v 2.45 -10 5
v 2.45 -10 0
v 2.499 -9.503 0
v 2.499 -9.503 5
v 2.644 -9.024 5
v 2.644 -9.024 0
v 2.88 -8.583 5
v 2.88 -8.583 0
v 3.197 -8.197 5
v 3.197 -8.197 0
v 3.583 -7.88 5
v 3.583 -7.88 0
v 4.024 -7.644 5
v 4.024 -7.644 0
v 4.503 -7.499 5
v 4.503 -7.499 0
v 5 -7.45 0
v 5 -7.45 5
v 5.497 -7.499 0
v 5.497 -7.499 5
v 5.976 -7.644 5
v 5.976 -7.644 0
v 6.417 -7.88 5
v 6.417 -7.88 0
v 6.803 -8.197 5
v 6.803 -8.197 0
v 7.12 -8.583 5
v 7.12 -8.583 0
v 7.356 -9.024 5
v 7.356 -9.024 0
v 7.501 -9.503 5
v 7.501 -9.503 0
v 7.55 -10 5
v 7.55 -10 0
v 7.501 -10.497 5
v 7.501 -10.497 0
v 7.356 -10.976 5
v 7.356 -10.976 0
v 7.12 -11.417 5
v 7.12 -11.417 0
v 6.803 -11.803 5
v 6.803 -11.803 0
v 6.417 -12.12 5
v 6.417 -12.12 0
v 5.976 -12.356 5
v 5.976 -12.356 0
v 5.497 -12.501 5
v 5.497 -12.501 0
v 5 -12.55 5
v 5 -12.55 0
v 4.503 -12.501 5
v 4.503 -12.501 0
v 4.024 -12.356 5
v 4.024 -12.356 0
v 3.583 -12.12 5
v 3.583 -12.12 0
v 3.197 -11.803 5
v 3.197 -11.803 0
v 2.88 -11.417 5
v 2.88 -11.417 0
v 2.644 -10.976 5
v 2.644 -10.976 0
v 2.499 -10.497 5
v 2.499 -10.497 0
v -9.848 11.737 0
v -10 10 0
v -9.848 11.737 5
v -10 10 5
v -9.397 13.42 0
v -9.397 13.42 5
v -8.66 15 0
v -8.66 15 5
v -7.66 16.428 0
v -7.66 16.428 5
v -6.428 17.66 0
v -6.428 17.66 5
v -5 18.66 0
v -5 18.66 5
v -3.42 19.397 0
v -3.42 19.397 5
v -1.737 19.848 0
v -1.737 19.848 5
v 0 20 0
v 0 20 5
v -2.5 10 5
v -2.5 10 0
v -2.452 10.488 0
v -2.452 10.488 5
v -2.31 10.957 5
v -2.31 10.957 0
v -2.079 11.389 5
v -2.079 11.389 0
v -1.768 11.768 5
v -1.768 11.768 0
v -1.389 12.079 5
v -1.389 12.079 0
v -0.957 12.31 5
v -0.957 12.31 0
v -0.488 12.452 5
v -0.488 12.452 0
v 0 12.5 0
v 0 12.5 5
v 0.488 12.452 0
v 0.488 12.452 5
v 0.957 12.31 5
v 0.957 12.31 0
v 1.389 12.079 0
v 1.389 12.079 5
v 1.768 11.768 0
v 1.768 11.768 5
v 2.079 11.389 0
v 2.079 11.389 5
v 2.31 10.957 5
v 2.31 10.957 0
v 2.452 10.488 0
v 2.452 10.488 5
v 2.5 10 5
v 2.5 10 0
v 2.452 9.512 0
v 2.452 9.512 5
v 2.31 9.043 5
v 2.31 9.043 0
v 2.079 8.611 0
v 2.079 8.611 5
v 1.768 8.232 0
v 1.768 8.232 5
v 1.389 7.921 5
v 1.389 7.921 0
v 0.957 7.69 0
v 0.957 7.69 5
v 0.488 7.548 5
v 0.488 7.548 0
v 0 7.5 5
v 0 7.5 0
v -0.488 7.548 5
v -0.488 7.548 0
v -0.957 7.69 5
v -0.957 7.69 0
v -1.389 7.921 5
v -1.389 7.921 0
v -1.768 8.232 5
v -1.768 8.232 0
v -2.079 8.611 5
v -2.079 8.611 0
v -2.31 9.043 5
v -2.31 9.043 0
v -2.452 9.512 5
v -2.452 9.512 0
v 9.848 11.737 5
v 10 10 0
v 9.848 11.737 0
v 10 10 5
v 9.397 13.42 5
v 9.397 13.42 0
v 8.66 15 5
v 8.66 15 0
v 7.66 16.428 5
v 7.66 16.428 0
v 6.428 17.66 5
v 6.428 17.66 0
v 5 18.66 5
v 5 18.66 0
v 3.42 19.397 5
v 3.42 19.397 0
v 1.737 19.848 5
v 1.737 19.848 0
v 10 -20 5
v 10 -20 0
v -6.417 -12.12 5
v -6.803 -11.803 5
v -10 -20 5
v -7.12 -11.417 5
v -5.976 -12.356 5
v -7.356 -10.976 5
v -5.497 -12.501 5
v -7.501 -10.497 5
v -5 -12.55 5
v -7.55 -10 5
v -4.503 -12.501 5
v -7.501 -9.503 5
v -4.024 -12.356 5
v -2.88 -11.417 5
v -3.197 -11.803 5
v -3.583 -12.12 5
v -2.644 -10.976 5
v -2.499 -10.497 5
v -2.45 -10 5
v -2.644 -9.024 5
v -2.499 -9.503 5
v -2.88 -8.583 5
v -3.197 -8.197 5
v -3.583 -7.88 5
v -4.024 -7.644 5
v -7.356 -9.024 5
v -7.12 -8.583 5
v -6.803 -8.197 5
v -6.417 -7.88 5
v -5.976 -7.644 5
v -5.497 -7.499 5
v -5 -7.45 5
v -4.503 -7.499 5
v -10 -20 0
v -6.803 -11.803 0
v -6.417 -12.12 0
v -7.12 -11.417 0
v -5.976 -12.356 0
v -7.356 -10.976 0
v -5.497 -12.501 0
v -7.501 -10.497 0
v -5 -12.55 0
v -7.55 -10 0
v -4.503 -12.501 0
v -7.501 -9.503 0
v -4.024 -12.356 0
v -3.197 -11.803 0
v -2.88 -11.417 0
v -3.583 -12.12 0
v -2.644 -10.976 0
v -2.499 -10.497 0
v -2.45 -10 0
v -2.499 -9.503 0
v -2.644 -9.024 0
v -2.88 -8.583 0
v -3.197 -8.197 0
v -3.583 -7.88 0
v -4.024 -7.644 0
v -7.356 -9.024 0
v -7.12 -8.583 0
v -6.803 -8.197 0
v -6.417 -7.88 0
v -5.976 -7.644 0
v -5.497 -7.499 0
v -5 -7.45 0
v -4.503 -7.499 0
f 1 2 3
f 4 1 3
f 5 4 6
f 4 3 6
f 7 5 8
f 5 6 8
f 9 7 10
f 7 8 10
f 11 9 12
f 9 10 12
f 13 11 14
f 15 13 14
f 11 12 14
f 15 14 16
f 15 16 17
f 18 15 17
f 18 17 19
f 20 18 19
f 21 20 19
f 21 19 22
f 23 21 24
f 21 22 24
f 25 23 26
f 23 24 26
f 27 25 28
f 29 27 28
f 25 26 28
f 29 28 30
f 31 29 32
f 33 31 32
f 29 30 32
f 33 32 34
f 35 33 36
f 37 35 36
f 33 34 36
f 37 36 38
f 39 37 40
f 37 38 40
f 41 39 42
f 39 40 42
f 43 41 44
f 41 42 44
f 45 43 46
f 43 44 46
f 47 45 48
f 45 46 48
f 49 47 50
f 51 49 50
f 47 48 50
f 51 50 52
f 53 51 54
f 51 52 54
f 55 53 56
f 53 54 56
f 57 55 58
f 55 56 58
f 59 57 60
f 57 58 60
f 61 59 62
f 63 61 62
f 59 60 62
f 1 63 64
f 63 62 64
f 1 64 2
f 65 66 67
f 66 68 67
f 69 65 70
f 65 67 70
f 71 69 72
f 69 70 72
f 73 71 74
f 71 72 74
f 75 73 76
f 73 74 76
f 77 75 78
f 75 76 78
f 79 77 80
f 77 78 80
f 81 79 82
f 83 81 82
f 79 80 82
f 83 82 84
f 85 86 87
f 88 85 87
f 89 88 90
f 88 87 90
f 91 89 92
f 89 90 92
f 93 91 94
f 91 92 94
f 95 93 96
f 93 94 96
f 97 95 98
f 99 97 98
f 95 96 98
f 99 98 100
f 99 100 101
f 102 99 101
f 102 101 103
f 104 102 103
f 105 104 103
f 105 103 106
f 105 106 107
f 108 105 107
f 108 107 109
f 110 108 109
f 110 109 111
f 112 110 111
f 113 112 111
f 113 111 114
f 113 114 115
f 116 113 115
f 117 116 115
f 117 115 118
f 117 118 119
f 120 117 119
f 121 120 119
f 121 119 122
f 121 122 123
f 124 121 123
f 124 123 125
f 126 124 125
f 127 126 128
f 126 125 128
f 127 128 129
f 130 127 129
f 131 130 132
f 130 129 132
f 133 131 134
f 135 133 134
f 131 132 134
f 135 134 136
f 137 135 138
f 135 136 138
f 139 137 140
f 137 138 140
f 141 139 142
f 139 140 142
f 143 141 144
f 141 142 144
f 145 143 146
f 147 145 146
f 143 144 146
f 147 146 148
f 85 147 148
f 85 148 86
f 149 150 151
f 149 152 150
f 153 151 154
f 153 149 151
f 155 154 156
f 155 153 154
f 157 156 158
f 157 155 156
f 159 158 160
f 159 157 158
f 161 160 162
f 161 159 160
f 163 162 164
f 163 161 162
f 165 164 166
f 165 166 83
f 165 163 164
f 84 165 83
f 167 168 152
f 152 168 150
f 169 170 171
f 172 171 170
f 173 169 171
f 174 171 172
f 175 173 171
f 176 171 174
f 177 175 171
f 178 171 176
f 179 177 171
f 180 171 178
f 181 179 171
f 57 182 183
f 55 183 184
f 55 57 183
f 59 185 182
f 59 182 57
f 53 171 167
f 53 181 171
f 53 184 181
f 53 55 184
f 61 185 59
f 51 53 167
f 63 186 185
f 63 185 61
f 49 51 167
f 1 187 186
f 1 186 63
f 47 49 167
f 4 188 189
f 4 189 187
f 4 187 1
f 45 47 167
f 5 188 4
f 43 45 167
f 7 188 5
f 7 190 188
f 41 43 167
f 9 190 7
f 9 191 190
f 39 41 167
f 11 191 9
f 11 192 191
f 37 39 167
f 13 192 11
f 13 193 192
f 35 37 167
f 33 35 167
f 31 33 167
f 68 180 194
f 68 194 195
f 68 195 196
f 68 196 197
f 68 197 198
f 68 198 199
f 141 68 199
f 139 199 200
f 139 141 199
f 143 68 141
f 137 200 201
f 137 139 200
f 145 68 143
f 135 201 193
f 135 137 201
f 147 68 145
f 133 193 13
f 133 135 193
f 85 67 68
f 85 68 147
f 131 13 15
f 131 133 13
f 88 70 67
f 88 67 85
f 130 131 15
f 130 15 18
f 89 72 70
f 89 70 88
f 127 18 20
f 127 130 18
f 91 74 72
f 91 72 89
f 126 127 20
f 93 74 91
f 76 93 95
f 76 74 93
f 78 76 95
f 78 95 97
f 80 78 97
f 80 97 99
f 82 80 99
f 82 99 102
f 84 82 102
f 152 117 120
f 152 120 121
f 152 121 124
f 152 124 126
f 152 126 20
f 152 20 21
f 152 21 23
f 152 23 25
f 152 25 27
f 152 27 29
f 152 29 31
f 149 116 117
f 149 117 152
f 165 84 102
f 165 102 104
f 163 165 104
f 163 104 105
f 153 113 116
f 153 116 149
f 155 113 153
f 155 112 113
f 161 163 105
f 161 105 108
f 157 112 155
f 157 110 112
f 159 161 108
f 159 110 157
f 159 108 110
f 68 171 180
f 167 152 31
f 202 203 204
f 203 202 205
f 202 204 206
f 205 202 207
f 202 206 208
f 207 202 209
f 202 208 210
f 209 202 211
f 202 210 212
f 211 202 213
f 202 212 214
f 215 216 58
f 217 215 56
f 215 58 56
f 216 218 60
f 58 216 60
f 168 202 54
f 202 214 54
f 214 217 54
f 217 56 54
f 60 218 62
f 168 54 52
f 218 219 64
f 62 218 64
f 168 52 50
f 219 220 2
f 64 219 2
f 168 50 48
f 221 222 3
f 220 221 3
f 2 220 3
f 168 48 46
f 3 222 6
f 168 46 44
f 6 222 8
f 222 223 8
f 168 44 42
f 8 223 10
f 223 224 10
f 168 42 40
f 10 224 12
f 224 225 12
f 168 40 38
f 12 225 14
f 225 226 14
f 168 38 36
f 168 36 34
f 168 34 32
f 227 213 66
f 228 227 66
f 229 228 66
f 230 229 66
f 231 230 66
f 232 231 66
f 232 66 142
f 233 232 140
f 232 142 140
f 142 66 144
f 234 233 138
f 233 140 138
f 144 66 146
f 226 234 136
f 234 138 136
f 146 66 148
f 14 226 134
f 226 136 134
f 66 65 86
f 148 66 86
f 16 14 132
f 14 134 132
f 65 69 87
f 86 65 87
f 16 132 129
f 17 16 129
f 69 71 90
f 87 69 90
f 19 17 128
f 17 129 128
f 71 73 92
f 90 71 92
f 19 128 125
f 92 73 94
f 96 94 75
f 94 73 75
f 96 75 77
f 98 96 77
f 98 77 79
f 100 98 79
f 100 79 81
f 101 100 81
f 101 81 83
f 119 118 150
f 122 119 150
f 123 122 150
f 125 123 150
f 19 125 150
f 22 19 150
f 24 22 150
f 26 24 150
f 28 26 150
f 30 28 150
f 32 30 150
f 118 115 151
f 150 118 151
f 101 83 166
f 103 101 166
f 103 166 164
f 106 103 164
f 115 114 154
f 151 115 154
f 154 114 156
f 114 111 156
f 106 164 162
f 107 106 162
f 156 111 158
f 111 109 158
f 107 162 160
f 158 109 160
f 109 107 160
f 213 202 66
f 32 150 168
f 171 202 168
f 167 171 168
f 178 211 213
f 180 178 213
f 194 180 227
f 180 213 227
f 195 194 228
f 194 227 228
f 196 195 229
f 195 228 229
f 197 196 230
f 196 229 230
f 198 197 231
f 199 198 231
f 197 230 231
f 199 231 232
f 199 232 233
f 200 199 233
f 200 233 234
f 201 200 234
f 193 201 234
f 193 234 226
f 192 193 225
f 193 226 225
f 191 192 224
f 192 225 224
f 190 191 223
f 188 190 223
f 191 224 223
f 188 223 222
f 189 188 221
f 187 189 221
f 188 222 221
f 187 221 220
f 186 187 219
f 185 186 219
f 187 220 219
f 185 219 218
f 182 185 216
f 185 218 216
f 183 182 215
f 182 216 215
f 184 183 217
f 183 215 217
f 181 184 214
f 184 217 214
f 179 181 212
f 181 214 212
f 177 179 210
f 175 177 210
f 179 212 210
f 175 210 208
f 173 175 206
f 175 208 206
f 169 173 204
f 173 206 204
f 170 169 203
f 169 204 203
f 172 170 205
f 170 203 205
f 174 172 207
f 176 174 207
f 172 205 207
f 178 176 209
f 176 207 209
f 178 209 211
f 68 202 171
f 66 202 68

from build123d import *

# Parameters (mm, degrees)
SKETCH1_W           = 20
SKETCH1_H           = 40
BOSS_EXTRUDE1_DEPTH = 5
FILLET2_R           = 10
SKETCH2_R           = 2.5
CUT_EXTRUDE1_DEPTH  = 23.912878475
SKETCH3_R           = 2.55
CUT_EXTRUDE2_DEPTH  = 5


with BuildPart() as part:
    # Sketch1 → Boss-Extrude1 (new body)
    with BuildSketch(Plane.XY):
        Rectangle(SKETCH1_W, SKETCH1_H)
    extrude(amount=BOSS_EXTRUDE1_DEPTH)

    # Fillet2
    fillet2_edges = [part.edges().sort_by_distance(p)[0] for p in [
        (-10, 20, 2.5),
        (10, 20, 2.5),
    ]]
    fillet(fillet2_edges, radius=FILLET2_R - 0.0001)  # a hair under: the kernel refuses the full size

    # Sketch2 → Cut-Extrude1 (cut, through all)
    with BuildSketch(Plane(origin=(0, 0, 0), x_dir=(-1, 0, 0), z_dir=(0, 0, -1))):
        with Locations((0, 10)):
            Circle(SKETCH2_R)
    extrude(amount=-CUT_EXTRUDE1_DEPTH, mode=Mode.SUBTRACT)

    # Sketch3 → Cut-Extrude2 (cut)
    with BuildSketch(Plane(origin=(0, 0, 0), x_dir=(-1, 0, 0), z_dir=(0, 0, -1))):
        with Locations((-5, -10)):
            Circle(SKETCH3_R)
        with Locations((5, -10)):
            Circle(SKETCH3_R)
    extrude(amount=-CUT_EXTRUDE2_DEPTH, mode=Mode.SUBTRACT)


solid = part.part
